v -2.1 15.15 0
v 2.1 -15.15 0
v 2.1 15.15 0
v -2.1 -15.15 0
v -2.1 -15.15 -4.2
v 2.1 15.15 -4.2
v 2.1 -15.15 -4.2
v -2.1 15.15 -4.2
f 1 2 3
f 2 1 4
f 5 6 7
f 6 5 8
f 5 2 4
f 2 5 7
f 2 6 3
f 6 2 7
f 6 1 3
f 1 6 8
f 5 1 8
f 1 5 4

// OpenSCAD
module foot(wood_w = 15, gim_t = 4.2, gap = 0.3)
{
    translate([0, 0, -gim_t/2]) 
    {
        color([0.75,0.48,0.19, 1.0])
        cube([gim_t, 2*wood_w+gap, gim_t], center = true);
    }
}        

foot();
